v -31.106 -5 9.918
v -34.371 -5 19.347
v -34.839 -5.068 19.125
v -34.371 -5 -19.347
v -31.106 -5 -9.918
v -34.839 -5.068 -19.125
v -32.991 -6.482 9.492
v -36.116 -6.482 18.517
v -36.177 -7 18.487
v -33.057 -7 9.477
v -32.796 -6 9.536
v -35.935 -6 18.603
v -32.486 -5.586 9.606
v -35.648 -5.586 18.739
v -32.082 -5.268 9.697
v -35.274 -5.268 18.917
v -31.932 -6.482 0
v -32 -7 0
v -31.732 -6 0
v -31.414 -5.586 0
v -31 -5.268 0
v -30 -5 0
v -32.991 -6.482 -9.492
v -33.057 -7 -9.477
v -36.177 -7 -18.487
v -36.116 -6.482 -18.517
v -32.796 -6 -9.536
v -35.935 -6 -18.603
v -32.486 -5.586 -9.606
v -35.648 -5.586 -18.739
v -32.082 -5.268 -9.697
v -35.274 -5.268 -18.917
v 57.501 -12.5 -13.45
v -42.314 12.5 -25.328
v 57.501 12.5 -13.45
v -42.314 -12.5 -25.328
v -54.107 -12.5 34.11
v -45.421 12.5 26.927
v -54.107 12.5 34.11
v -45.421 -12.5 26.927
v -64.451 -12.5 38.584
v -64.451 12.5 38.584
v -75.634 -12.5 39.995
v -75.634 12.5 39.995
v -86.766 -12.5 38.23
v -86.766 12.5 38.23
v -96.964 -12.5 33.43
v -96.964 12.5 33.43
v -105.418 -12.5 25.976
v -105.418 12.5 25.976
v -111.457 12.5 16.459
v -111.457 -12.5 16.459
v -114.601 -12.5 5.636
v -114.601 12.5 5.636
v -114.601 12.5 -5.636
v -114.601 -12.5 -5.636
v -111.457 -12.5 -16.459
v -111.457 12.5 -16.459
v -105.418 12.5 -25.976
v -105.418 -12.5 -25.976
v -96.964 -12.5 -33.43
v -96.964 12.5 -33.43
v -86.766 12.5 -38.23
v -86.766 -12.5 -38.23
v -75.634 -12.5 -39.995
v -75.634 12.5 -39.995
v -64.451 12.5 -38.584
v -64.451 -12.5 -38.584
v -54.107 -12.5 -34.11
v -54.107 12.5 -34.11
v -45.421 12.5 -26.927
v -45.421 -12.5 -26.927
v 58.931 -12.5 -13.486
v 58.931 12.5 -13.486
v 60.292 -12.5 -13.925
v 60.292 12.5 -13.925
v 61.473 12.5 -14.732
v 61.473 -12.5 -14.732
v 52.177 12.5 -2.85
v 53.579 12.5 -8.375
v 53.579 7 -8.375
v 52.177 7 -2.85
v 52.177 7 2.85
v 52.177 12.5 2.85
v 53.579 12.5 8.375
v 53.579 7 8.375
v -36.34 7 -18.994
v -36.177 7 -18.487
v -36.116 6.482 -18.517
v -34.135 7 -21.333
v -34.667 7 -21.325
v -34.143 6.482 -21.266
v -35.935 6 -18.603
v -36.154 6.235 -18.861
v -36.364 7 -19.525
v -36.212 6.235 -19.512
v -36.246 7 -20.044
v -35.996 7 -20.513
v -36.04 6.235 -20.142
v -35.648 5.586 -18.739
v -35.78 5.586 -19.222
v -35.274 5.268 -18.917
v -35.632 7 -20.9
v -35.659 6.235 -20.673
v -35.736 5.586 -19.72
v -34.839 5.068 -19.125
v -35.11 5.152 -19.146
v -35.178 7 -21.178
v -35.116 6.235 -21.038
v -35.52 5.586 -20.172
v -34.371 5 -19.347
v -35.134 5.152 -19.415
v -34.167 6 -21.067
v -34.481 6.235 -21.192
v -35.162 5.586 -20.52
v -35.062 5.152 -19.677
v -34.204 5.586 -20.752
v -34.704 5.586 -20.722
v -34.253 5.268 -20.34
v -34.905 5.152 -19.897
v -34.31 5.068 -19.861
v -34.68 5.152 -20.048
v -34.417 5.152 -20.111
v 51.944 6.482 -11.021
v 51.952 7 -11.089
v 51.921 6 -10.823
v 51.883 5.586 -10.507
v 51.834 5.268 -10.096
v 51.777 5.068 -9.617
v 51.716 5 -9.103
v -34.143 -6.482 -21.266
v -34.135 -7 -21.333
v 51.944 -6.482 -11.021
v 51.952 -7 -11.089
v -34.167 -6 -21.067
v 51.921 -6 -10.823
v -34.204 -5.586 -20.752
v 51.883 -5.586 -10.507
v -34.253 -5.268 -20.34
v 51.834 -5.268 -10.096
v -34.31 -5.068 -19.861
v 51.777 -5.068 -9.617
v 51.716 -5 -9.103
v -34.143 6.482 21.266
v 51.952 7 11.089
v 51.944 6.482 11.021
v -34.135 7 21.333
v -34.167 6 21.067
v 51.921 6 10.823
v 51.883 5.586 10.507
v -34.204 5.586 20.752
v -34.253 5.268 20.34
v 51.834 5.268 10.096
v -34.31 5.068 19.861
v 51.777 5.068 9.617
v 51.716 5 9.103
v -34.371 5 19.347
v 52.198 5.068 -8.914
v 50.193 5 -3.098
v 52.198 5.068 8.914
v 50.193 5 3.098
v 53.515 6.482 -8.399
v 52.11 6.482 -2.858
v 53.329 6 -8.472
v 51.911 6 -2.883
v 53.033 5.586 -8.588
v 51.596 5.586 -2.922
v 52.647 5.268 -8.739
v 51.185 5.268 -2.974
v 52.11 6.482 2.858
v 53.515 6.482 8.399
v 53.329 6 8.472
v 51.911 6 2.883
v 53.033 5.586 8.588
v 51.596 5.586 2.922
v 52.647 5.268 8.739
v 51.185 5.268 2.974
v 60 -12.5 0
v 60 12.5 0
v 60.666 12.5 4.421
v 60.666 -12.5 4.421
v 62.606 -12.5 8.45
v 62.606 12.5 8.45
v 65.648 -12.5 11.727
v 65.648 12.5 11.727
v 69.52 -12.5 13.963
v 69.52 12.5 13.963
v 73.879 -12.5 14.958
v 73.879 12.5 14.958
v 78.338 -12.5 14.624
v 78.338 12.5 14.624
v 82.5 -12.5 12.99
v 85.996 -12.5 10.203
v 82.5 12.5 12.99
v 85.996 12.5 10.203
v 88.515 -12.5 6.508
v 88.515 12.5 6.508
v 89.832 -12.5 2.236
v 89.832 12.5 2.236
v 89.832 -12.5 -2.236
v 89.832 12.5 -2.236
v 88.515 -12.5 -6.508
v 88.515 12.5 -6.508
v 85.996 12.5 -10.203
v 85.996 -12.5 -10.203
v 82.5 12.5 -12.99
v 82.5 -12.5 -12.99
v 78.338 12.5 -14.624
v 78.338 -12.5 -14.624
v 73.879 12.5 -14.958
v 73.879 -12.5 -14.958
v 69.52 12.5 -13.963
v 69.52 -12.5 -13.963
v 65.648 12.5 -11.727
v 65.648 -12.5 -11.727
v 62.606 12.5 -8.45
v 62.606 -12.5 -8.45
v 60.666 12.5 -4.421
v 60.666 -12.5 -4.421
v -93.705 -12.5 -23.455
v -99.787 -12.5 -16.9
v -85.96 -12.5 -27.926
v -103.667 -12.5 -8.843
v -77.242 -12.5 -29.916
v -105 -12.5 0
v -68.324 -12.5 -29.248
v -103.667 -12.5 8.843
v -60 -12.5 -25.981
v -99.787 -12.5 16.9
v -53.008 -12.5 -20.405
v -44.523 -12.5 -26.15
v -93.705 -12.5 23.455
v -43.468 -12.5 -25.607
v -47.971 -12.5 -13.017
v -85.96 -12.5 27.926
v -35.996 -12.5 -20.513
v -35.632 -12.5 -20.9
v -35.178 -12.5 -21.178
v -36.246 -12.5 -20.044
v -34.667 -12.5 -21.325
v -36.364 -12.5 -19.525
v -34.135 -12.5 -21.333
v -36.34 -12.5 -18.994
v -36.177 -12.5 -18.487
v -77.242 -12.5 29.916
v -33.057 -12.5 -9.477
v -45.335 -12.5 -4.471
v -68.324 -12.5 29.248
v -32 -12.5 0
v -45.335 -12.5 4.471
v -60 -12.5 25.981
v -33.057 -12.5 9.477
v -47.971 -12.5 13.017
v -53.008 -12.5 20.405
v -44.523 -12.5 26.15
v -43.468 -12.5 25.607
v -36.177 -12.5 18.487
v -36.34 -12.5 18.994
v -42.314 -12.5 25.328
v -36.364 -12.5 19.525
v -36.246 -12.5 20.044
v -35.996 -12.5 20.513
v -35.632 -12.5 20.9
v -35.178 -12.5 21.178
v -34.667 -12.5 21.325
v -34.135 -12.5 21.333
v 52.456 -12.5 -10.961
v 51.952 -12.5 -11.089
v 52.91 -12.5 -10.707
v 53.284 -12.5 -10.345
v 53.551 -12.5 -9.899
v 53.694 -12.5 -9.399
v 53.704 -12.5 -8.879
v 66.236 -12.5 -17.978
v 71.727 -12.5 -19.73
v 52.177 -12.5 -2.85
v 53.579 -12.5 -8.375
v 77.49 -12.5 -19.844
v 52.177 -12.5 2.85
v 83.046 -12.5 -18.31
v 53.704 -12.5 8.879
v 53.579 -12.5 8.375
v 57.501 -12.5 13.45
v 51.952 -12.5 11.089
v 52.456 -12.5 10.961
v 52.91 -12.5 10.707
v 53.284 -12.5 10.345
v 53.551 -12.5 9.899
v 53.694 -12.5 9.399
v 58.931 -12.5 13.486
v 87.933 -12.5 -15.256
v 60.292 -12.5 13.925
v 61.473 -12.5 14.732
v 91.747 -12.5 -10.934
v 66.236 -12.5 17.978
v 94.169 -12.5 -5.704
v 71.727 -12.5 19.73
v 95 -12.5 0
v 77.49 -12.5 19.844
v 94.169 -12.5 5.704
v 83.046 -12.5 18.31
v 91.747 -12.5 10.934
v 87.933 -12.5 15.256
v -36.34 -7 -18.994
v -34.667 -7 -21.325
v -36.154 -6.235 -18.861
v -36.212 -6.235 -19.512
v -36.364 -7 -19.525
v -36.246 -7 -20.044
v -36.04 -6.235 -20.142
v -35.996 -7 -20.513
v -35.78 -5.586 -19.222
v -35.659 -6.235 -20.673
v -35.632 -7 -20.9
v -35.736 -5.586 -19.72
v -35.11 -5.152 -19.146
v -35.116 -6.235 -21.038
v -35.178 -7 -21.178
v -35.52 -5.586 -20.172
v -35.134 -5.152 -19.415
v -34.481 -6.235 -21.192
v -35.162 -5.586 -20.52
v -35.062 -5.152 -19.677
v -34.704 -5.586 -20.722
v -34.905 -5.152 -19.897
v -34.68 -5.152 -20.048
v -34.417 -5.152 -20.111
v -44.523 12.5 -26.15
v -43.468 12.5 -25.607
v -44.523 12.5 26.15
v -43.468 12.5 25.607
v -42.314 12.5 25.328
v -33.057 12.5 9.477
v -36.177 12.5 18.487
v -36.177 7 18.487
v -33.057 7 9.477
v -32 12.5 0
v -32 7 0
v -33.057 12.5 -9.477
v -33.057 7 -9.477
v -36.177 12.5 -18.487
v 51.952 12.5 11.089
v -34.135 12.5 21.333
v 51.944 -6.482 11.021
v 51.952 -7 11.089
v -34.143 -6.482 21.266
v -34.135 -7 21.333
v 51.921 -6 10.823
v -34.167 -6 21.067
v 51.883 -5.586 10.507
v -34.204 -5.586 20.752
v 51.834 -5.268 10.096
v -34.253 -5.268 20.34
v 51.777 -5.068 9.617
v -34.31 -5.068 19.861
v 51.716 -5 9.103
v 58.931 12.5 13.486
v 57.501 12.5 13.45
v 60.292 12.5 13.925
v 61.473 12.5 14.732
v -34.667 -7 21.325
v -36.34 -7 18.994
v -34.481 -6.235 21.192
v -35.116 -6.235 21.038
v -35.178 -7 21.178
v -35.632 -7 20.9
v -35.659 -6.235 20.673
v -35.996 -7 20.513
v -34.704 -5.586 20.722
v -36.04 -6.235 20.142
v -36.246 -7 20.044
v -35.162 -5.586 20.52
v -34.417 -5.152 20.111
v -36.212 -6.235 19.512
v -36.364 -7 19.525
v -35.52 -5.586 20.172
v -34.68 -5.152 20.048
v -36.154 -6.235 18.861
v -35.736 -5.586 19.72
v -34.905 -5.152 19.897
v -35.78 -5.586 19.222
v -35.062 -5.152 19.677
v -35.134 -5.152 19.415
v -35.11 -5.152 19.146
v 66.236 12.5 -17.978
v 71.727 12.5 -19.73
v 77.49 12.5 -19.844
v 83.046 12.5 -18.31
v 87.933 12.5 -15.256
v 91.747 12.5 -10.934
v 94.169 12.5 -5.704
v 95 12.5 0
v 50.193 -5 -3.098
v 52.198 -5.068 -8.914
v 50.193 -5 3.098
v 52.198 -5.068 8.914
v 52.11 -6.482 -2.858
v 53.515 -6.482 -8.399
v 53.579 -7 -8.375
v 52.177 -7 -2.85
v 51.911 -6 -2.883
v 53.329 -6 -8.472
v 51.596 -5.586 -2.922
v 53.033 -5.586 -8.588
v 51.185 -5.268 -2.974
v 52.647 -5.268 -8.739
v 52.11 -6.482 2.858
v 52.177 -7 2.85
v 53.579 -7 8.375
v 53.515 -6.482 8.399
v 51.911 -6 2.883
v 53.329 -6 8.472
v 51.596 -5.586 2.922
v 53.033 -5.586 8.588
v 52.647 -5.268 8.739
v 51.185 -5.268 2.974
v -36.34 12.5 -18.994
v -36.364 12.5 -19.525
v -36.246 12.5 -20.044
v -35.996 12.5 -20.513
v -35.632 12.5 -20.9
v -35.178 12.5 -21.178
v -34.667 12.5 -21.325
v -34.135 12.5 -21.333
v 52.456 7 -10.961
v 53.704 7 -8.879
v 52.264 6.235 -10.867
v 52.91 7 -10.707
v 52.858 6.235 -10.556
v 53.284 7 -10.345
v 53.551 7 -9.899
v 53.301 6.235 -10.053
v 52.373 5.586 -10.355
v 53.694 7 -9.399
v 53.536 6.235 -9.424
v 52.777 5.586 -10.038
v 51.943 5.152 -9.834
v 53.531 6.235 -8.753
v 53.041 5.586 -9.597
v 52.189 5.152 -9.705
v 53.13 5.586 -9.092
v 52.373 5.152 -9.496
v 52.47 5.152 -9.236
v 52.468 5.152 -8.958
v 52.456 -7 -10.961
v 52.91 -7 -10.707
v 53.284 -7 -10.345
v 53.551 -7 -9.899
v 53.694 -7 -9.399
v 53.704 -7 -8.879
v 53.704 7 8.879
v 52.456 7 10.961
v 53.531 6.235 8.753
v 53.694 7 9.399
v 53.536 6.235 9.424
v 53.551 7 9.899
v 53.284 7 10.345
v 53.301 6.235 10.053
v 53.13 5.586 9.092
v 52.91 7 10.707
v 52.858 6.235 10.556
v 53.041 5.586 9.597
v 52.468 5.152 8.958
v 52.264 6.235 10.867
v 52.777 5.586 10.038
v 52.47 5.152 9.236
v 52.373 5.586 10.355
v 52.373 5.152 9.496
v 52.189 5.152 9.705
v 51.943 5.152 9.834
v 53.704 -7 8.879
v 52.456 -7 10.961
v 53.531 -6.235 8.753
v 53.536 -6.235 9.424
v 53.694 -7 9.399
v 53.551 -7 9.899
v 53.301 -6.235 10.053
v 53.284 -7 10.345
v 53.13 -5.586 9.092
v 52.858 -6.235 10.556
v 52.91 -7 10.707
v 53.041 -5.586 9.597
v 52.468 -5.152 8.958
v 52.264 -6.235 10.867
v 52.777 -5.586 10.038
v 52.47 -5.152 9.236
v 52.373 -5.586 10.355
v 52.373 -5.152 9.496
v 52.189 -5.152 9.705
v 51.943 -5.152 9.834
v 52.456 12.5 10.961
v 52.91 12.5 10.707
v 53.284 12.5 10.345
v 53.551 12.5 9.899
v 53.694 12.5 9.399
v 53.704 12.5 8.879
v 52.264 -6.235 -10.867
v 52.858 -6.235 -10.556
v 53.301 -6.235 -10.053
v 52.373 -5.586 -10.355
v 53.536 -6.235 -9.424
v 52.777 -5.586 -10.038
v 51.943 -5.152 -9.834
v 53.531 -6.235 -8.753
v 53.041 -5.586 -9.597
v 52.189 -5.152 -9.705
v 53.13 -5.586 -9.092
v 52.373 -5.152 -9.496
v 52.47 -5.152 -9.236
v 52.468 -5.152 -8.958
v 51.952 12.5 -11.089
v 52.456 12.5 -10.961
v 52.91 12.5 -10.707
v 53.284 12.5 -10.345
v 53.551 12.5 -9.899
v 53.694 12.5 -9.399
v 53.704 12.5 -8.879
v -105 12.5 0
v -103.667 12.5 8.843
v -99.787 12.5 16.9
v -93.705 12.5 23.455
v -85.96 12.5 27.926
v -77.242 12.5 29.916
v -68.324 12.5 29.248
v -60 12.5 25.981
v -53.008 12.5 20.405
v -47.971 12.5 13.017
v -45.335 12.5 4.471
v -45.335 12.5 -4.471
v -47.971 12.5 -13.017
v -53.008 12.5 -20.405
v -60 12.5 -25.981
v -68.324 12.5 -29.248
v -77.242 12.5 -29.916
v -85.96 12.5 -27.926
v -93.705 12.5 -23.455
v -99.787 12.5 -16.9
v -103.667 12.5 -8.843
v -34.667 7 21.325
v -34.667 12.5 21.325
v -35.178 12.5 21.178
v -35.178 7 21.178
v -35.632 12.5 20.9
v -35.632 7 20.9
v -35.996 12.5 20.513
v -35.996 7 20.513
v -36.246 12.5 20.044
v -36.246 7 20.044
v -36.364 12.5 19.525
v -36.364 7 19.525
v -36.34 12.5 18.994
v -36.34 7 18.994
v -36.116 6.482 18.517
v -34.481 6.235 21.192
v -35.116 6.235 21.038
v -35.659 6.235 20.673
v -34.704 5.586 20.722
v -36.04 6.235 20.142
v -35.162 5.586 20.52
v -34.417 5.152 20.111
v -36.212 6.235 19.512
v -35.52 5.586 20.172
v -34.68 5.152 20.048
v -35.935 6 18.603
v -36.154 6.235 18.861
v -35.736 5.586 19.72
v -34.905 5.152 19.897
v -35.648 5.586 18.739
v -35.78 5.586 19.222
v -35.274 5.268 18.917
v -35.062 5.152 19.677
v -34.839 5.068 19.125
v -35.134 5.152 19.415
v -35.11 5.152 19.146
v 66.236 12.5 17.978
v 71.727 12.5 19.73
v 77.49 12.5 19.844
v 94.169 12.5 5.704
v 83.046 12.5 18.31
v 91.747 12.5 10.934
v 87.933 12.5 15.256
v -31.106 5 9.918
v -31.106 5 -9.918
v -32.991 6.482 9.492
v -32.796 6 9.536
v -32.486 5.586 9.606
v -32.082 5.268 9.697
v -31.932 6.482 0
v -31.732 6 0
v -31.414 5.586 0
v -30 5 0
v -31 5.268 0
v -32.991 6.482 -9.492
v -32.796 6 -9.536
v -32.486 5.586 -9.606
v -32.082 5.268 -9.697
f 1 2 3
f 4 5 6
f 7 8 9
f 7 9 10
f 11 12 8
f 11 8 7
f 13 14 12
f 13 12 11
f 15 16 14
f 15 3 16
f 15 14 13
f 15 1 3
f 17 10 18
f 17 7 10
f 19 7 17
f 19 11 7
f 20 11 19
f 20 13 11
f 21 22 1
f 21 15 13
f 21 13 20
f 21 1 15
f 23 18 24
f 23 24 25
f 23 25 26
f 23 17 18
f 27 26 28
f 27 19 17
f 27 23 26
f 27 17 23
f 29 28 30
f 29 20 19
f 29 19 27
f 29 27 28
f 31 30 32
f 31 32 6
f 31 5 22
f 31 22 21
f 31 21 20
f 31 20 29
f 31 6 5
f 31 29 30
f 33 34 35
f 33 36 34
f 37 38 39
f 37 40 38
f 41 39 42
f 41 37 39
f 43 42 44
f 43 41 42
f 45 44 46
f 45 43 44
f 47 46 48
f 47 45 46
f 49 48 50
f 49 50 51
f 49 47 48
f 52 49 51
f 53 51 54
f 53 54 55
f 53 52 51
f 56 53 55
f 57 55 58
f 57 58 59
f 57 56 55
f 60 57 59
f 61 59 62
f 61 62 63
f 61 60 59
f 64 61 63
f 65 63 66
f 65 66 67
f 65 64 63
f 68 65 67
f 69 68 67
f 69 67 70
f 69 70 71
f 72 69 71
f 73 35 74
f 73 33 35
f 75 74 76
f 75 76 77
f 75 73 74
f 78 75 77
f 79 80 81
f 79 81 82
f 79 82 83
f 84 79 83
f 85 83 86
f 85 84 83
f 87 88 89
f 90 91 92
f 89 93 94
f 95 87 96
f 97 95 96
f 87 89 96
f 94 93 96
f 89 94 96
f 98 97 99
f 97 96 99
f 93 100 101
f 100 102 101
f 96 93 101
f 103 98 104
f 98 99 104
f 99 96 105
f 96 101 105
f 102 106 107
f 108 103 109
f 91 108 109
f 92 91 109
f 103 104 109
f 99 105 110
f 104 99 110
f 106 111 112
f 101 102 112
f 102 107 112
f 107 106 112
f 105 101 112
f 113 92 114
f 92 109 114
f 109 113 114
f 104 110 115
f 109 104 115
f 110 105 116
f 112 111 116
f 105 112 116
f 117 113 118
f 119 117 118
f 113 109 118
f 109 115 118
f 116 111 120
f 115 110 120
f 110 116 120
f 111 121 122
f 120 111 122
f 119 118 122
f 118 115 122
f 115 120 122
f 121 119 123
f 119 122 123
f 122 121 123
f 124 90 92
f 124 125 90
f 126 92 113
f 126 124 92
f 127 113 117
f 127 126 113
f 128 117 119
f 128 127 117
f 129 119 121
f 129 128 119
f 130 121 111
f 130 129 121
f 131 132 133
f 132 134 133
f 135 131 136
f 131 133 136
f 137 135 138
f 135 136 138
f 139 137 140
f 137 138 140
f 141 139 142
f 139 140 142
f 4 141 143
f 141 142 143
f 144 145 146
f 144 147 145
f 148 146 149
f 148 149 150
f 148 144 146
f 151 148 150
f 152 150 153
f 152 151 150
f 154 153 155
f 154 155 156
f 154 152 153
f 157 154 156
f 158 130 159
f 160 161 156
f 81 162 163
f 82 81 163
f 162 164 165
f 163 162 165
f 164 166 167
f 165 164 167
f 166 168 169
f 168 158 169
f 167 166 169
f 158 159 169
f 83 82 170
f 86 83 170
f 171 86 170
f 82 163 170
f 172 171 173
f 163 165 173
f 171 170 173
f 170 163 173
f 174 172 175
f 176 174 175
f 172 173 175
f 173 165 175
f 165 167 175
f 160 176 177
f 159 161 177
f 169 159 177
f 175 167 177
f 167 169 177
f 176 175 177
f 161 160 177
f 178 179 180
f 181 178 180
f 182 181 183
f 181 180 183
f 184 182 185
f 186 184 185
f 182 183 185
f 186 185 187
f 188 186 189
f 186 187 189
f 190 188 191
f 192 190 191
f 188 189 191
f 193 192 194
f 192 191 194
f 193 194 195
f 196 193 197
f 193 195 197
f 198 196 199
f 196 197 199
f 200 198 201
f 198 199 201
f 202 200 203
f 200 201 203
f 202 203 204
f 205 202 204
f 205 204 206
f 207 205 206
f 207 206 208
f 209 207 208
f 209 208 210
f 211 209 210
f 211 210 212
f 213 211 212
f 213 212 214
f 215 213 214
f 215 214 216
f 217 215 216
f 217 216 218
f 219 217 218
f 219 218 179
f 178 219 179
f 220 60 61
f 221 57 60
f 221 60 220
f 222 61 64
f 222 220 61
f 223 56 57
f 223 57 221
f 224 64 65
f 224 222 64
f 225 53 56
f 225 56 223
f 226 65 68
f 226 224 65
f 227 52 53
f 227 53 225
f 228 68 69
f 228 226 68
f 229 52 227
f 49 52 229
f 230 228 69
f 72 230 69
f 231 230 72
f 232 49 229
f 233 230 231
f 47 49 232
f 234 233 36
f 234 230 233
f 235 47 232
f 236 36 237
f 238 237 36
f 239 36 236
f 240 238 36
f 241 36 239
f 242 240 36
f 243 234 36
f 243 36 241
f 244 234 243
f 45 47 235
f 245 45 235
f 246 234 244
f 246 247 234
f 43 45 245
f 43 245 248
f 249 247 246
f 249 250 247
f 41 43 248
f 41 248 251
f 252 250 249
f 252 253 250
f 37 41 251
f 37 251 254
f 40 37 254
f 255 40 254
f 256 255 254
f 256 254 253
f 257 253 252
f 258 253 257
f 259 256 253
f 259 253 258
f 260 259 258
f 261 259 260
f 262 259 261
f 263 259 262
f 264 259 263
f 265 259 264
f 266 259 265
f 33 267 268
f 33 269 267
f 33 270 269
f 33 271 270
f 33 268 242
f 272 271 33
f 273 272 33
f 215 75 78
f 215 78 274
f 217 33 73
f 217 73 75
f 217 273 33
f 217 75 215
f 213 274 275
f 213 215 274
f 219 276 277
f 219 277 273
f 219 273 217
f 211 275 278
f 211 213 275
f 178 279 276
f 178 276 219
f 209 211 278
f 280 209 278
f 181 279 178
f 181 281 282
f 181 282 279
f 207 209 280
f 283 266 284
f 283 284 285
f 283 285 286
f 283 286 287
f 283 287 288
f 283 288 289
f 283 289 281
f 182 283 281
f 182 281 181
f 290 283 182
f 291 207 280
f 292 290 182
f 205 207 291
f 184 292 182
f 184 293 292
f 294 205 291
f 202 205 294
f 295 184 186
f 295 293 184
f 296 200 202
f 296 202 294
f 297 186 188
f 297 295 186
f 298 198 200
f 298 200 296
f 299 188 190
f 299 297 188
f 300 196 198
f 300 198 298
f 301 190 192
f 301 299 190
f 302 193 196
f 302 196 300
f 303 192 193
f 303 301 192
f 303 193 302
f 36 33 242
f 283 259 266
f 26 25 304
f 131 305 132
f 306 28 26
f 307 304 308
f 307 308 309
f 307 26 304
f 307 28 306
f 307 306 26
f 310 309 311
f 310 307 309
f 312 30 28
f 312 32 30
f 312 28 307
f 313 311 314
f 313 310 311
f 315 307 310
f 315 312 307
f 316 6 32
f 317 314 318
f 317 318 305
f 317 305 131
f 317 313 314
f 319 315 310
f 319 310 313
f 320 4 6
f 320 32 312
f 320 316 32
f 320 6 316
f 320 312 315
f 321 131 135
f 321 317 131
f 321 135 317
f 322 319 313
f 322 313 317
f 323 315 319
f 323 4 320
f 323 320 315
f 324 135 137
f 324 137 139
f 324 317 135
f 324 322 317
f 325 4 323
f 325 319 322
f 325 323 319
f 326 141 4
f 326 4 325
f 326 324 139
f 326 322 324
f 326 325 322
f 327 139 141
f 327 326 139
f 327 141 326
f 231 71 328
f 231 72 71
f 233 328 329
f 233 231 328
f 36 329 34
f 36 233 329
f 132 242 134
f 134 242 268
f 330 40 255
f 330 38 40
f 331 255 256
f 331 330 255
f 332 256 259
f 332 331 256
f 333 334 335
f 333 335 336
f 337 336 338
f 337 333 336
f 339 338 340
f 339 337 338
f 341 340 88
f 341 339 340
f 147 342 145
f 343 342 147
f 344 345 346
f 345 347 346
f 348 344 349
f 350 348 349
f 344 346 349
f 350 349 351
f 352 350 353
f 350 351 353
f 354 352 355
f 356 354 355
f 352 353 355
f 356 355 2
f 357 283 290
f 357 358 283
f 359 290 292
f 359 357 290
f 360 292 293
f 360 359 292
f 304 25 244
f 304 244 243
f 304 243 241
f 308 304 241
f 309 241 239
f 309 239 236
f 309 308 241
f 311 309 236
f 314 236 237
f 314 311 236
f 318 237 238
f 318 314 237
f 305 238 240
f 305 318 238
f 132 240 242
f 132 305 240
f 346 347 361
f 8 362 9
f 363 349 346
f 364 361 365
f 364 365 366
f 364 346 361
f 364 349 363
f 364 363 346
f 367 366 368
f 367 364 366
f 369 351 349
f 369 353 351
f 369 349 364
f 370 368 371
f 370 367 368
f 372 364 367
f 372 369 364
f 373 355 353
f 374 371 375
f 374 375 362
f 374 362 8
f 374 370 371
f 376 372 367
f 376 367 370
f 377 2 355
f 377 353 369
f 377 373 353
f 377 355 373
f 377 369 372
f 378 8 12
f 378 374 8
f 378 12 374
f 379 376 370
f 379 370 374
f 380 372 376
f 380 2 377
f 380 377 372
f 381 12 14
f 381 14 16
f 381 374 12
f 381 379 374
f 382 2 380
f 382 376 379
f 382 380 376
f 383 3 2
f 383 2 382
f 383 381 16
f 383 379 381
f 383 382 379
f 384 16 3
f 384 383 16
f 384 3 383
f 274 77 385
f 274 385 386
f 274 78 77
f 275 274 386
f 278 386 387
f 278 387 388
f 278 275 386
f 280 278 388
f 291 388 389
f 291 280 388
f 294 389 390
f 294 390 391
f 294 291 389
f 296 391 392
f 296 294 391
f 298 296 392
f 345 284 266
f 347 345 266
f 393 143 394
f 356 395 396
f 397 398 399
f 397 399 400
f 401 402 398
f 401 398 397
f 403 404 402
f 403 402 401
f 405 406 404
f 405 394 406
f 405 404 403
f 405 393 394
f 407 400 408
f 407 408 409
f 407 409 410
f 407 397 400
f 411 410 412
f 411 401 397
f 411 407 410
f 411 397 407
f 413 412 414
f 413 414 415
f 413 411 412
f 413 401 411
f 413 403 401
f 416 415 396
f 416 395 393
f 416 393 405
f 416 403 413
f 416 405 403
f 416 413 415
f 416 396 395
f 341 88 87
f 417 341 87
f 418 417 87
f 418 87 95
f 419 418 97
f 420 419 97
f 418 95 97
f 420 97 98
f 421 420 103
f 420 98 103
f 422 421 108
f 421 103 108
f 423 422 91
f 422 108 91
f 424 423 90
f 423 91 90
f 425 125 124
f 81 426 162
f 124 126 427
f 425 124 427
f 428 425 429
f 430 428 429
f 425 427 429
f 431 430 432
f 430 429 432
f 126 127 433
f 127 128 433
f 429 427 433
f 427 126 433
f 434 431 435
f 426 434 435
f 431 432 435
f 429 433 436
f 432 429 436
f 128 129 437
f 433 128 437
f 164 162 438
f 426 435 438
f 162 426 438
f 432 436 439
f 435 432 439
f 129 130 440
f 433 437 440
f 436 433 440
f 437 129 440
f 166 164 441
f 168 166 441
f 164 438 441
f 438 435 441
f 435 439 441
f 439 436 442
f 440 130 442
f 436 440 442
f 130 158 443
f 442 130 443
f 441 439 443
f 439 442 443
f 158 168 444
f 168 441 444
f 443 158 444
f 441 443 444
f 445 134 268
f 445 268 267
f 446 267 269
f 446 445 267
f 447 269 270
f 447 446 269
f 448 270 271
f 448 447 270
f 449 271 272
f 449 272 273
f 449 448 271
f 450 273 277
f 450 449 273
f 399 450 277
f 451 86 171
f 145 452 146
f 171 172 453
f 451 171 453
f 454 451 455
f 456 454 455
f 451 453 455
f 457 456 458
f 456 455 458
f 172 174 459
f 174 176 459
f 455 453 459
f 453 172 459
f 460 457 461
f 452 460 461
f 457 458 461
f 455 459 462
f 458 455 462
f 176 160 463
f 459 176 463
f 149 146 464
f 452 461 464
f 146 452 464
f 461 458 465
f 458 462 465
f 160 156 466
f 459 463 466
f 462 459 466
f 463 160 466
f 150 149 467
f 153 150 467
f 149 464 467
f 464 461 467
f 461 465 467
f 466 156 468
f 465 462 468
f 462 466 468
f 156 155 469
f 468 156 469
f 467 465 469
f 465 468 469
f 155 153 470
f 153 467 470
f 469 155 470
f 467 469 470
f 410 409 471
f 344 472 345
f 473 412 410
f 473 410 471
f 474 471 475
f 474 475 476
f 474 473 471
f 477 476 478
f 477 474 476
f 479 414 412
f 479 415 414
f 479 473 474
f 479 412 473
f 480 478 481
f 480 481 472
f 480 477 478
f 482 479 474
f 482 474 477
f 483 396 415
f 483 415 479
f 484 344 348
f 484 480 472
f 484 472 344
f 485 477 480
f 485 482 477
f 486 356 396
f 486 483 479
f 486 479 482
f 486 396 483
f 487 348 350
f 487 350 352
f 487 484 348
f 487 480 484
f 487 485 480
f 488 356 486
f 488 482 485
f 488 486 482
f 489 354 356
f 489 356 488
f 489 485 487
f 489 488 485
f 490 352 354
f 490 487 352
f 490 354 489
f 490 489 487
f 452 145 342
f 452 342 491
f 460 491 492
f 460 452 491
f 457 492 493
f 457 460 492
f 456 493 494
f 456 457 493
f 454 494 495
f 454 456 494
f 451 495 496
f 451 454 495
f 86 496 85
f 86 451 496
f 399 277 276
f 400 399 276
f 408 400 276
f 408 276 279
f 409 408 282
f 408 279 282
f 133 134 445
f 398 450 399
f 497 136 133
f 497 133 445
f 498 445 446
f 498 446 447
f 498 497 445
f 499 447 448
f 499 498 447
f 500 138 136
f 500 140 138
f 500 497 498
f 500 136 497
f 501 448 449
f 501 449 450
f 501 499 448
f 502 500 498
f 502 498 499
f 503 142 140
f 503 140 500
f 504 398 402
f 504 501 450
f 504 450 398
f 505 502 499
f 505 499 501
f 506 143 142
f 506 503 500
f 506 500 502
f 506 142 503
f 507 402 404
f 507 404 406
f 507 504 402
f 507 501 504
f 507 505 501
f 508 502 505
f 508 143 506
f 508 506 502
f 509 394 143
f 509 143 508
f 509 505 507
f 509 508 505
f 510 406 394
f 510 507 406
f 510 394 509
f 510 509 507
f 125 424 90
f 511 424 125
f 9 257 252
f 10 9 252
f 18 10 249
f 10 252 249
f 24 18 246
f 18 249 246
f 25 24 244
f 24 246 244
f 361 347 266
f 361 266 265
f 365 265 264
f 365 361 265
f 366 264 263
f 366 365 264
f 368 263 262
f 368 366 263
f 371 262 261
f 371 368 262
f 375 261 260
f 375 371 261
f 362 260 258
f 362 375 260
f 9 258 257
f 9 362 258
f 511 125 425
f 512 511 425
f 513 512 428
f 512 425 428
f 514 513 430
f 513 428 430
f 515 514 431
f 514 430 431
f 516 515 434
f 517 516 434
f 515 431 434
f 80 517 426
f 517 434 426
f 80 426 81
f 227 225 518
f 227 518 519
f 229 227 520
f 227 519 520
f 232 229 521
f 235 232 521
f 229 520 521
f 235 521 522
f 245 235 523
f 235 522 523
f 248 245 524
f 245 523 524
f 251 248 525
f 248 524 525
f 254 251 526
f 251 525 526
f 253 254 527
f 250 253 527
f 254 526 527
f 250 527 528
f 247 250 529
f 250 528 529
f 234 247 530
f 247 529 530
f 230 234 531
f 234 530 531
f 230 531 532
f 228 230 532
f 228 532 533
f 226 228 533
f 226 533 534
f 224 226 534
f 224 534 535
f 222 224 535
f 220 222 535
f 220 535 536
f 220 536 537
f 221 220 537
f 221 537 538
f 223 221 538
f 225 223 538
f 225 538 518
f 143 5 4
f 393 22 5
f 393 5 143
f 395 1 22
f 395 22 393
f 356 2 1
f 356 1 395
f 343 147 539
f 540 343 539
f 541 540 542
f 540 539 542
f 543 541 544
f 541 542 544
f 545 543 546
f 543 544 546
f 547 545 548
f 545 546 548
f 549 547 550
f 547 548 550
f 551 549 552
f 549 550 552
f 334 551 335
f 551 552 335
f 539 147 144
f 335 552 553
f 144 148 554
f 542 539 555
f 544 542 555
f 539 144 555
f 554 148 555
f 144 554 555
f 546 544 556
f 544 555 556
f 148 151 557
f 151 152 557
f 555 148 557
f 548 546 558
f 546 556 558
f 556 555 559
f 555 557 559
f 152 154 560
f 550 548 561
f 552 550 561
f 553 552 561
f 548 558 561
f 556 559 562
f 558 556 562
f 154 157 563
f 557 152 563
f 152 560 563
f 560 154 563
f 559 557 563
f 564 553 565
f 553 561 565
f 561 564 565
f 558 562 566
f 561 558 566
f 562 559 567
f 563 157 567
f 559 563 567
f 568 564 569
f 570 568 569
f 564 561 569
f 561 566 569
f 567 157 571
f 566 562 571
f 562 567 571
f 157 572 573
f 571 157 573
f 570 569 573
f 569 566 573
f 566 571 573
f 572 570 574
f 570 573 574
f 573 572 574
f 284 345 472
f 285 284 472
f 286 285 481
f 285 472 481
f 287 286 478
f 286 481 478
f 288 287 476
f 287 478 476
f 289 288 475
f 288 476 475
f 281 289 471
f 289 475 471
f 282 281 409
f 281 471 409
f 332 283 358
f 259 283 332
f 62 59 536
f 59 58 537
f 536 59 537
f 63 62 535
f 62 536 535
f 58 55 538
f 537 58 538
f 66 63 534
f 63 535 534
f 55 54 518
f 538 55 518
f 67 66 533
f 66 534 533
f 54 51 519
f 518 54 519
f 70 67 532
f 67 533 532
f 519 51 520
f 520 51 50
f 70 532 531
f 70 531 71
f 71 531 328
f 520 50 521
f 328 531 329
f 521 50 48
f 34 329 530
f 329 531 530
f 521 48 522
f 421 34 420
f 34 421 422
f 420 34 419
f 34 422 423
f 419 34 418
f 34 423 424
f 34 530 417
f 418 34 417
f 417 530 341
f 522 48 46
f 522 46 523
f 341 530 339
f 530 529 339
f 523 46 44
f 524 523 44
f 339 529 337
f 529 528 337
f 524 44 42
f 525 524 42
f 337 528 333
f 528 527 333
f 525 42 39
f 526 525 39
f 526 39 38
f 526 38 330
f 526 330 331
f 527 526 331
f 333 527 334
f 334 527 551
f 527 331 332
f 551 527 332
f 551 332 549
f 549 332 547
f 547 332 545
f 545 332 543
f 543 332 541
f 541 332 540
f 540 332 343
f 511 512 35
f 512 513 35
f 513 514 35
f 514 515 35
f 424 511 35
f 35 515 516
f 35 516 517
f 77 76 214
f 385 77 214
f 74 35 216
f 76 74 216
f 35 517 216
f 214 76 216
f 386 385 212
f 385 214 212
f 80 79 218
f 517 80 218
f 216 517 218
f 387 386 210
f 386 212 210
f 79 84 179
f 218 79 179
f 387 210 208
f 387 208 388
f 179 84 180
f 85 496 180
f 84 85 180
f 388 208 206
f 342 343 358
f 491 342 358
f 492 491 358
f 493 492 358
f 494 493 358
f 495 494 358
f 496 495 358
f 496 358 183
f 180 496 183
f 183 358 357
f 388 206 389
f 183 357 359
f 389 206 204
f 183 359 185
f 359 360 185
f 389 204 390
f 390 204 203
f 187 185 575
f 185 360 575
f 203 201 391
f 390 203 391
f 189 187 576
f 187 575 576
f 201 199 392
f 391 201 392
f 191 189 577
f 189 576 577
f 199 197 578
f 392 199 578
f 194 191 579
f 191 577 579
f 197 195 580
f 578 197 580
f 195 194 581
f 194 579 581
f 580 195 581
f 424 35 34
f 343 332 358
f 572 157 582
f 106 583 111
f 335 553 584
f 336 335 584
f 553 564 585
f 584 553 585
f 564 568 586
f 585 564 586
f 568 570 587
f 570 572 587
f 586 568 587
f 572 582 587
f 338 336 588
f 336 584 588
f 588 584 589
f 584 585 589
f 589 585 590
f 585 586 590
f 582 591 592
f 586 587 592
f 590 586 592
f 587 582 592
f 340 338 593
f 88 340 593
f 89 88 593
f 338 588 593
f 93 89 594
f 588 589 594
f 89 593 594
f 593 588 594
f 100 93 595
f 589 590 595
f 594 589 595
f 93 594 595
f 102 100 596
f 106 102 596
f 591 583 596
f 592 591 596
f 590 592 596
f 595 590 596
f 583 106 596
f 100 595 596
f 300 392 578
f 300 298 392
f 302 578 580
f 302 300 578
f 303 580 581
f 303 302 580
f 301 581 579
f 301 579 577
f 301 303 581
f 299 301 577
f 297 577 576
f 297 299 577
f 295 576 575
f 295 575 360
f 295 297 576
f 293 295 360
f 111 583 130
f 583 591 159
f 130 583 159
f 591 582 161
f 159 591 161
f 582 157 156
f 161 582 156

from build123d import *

# Parameters (mm, degrees)
F1_DEPTH = 12.5
F3_DEPTH = 7.5
F4_R     = 2
F5_R     = 2
F8_D     = 60
F9_D     = 30
F10_R    = 5


with BuildPart() as f1:
    # F0 (on Front) → F1 (new body)
    with BuildSketch(Plane.XZ):
        with BuildLine():
            ThreePointArc((-44.228067, -25.55559), (-37.377684, -13.585336), (-35, 0))
            ThreePointArc((-35, 0), (-37.377684, 13.585336), (-44.228067, 25.55559))
            ThreePointArc((-44.228067, 25.55559), (-115, 0), (-44.228067, -25.55559))
        make_face()
        with BuildLine():
            ThreePointArc((-44.228067, 25.55559), (-37.377684, 13.585336), (-35, 0))
            ThreePointArc((-35, 0), (-37.377684, -13.585336), (-44.228067, -25.55559))
            Line((-44.228067, -25.55559), (59.939192, -13.159486))
            ThreePointArc((59.939192, -13.159486), (55, 0), (59.939192, 13.159486))
            Line((59.939192, 13.159486), (-44.228067, 25.55559))
        make_face()
        with BuildLine():
            ThreePointArc((95, 0), (82.027938, 18.724532), (59.939192, 13.159486))
            ThreePointArc((59.939192, 13.159486), (55, 0), (59.939192, -13.159486))
            ThreePointArc((59.939192, -13.159486), (82.027938, -18.724532), (95, 0))
        make_face()
    extrude(amount=F1_DEPTH)

    # F2 (on face) → F3 (cut)
    with BuildSketch(Plane.XZ.offset(12.5)):
        with BuildLine():
            Line((54.674672, 10.764806), (-37.926643, 21.78454))
            ThreePointArc((-37.926643, 21.78454), (-32, 0), (-37.926643, -21.78454))
            Line((-37.926643, -21.78454), (54.674672, -10.764806))
            ThreePointArc((54.674672, -10.764806), (52, 0), (54.674672, 10.764806))
        make_face()
    extrude(amount=-F3_DEPTH, mode=Mode.SUBTRACT)

    # F4
    f4_edges = [f1.edges().sort_by_distance(p)[0] for p in [
        (-37.926643, -8.75, -21.78454),
        (54.674672, -8.75, 10.764806),
        (54.674672, -8.75, -10.764806),
        (-37.926643, -8.75, 21.78454),
    ]]
    fillet(f4_edges, radius=F4_R)

    # F5
    f5_edges = [f1.edges().sort_by_distance(p)[0] for p in [
        (8.908671, -5, 16.211048),
    ]]
    fillet(f5_edges, radius=F5_R)

    # F6: F1 across plane


with BuildPart() as f1_1:
    add(f1.part)
    add(f1.part.mirror(Plane.XZ))

    # F8 (through all)
    with Locations(Plane.XZ.offset(12.5)):
        with Locations((-75, 0)):
            Hole(F8_D / 2)

    # F9 (through all)
    with Locations(Plane.XZ.offset(12.5)):
        with Locations((75, 0)):
            Hole(F9_D / 2)

    # F10
    f10_edges = [f1_1.edges().sort_by_distance(p)[0] for p in [
        (-44.228067, -6.25, 25.55559),
        (59.939192, -6.25, 13.159486),
        (-44.228067, -6.25, -25.55559),
        (59.939192, -6.25, -13.159486),
    ]]
    fillet(f10_edges, radius=F10_R)


solid = f1_1.part
